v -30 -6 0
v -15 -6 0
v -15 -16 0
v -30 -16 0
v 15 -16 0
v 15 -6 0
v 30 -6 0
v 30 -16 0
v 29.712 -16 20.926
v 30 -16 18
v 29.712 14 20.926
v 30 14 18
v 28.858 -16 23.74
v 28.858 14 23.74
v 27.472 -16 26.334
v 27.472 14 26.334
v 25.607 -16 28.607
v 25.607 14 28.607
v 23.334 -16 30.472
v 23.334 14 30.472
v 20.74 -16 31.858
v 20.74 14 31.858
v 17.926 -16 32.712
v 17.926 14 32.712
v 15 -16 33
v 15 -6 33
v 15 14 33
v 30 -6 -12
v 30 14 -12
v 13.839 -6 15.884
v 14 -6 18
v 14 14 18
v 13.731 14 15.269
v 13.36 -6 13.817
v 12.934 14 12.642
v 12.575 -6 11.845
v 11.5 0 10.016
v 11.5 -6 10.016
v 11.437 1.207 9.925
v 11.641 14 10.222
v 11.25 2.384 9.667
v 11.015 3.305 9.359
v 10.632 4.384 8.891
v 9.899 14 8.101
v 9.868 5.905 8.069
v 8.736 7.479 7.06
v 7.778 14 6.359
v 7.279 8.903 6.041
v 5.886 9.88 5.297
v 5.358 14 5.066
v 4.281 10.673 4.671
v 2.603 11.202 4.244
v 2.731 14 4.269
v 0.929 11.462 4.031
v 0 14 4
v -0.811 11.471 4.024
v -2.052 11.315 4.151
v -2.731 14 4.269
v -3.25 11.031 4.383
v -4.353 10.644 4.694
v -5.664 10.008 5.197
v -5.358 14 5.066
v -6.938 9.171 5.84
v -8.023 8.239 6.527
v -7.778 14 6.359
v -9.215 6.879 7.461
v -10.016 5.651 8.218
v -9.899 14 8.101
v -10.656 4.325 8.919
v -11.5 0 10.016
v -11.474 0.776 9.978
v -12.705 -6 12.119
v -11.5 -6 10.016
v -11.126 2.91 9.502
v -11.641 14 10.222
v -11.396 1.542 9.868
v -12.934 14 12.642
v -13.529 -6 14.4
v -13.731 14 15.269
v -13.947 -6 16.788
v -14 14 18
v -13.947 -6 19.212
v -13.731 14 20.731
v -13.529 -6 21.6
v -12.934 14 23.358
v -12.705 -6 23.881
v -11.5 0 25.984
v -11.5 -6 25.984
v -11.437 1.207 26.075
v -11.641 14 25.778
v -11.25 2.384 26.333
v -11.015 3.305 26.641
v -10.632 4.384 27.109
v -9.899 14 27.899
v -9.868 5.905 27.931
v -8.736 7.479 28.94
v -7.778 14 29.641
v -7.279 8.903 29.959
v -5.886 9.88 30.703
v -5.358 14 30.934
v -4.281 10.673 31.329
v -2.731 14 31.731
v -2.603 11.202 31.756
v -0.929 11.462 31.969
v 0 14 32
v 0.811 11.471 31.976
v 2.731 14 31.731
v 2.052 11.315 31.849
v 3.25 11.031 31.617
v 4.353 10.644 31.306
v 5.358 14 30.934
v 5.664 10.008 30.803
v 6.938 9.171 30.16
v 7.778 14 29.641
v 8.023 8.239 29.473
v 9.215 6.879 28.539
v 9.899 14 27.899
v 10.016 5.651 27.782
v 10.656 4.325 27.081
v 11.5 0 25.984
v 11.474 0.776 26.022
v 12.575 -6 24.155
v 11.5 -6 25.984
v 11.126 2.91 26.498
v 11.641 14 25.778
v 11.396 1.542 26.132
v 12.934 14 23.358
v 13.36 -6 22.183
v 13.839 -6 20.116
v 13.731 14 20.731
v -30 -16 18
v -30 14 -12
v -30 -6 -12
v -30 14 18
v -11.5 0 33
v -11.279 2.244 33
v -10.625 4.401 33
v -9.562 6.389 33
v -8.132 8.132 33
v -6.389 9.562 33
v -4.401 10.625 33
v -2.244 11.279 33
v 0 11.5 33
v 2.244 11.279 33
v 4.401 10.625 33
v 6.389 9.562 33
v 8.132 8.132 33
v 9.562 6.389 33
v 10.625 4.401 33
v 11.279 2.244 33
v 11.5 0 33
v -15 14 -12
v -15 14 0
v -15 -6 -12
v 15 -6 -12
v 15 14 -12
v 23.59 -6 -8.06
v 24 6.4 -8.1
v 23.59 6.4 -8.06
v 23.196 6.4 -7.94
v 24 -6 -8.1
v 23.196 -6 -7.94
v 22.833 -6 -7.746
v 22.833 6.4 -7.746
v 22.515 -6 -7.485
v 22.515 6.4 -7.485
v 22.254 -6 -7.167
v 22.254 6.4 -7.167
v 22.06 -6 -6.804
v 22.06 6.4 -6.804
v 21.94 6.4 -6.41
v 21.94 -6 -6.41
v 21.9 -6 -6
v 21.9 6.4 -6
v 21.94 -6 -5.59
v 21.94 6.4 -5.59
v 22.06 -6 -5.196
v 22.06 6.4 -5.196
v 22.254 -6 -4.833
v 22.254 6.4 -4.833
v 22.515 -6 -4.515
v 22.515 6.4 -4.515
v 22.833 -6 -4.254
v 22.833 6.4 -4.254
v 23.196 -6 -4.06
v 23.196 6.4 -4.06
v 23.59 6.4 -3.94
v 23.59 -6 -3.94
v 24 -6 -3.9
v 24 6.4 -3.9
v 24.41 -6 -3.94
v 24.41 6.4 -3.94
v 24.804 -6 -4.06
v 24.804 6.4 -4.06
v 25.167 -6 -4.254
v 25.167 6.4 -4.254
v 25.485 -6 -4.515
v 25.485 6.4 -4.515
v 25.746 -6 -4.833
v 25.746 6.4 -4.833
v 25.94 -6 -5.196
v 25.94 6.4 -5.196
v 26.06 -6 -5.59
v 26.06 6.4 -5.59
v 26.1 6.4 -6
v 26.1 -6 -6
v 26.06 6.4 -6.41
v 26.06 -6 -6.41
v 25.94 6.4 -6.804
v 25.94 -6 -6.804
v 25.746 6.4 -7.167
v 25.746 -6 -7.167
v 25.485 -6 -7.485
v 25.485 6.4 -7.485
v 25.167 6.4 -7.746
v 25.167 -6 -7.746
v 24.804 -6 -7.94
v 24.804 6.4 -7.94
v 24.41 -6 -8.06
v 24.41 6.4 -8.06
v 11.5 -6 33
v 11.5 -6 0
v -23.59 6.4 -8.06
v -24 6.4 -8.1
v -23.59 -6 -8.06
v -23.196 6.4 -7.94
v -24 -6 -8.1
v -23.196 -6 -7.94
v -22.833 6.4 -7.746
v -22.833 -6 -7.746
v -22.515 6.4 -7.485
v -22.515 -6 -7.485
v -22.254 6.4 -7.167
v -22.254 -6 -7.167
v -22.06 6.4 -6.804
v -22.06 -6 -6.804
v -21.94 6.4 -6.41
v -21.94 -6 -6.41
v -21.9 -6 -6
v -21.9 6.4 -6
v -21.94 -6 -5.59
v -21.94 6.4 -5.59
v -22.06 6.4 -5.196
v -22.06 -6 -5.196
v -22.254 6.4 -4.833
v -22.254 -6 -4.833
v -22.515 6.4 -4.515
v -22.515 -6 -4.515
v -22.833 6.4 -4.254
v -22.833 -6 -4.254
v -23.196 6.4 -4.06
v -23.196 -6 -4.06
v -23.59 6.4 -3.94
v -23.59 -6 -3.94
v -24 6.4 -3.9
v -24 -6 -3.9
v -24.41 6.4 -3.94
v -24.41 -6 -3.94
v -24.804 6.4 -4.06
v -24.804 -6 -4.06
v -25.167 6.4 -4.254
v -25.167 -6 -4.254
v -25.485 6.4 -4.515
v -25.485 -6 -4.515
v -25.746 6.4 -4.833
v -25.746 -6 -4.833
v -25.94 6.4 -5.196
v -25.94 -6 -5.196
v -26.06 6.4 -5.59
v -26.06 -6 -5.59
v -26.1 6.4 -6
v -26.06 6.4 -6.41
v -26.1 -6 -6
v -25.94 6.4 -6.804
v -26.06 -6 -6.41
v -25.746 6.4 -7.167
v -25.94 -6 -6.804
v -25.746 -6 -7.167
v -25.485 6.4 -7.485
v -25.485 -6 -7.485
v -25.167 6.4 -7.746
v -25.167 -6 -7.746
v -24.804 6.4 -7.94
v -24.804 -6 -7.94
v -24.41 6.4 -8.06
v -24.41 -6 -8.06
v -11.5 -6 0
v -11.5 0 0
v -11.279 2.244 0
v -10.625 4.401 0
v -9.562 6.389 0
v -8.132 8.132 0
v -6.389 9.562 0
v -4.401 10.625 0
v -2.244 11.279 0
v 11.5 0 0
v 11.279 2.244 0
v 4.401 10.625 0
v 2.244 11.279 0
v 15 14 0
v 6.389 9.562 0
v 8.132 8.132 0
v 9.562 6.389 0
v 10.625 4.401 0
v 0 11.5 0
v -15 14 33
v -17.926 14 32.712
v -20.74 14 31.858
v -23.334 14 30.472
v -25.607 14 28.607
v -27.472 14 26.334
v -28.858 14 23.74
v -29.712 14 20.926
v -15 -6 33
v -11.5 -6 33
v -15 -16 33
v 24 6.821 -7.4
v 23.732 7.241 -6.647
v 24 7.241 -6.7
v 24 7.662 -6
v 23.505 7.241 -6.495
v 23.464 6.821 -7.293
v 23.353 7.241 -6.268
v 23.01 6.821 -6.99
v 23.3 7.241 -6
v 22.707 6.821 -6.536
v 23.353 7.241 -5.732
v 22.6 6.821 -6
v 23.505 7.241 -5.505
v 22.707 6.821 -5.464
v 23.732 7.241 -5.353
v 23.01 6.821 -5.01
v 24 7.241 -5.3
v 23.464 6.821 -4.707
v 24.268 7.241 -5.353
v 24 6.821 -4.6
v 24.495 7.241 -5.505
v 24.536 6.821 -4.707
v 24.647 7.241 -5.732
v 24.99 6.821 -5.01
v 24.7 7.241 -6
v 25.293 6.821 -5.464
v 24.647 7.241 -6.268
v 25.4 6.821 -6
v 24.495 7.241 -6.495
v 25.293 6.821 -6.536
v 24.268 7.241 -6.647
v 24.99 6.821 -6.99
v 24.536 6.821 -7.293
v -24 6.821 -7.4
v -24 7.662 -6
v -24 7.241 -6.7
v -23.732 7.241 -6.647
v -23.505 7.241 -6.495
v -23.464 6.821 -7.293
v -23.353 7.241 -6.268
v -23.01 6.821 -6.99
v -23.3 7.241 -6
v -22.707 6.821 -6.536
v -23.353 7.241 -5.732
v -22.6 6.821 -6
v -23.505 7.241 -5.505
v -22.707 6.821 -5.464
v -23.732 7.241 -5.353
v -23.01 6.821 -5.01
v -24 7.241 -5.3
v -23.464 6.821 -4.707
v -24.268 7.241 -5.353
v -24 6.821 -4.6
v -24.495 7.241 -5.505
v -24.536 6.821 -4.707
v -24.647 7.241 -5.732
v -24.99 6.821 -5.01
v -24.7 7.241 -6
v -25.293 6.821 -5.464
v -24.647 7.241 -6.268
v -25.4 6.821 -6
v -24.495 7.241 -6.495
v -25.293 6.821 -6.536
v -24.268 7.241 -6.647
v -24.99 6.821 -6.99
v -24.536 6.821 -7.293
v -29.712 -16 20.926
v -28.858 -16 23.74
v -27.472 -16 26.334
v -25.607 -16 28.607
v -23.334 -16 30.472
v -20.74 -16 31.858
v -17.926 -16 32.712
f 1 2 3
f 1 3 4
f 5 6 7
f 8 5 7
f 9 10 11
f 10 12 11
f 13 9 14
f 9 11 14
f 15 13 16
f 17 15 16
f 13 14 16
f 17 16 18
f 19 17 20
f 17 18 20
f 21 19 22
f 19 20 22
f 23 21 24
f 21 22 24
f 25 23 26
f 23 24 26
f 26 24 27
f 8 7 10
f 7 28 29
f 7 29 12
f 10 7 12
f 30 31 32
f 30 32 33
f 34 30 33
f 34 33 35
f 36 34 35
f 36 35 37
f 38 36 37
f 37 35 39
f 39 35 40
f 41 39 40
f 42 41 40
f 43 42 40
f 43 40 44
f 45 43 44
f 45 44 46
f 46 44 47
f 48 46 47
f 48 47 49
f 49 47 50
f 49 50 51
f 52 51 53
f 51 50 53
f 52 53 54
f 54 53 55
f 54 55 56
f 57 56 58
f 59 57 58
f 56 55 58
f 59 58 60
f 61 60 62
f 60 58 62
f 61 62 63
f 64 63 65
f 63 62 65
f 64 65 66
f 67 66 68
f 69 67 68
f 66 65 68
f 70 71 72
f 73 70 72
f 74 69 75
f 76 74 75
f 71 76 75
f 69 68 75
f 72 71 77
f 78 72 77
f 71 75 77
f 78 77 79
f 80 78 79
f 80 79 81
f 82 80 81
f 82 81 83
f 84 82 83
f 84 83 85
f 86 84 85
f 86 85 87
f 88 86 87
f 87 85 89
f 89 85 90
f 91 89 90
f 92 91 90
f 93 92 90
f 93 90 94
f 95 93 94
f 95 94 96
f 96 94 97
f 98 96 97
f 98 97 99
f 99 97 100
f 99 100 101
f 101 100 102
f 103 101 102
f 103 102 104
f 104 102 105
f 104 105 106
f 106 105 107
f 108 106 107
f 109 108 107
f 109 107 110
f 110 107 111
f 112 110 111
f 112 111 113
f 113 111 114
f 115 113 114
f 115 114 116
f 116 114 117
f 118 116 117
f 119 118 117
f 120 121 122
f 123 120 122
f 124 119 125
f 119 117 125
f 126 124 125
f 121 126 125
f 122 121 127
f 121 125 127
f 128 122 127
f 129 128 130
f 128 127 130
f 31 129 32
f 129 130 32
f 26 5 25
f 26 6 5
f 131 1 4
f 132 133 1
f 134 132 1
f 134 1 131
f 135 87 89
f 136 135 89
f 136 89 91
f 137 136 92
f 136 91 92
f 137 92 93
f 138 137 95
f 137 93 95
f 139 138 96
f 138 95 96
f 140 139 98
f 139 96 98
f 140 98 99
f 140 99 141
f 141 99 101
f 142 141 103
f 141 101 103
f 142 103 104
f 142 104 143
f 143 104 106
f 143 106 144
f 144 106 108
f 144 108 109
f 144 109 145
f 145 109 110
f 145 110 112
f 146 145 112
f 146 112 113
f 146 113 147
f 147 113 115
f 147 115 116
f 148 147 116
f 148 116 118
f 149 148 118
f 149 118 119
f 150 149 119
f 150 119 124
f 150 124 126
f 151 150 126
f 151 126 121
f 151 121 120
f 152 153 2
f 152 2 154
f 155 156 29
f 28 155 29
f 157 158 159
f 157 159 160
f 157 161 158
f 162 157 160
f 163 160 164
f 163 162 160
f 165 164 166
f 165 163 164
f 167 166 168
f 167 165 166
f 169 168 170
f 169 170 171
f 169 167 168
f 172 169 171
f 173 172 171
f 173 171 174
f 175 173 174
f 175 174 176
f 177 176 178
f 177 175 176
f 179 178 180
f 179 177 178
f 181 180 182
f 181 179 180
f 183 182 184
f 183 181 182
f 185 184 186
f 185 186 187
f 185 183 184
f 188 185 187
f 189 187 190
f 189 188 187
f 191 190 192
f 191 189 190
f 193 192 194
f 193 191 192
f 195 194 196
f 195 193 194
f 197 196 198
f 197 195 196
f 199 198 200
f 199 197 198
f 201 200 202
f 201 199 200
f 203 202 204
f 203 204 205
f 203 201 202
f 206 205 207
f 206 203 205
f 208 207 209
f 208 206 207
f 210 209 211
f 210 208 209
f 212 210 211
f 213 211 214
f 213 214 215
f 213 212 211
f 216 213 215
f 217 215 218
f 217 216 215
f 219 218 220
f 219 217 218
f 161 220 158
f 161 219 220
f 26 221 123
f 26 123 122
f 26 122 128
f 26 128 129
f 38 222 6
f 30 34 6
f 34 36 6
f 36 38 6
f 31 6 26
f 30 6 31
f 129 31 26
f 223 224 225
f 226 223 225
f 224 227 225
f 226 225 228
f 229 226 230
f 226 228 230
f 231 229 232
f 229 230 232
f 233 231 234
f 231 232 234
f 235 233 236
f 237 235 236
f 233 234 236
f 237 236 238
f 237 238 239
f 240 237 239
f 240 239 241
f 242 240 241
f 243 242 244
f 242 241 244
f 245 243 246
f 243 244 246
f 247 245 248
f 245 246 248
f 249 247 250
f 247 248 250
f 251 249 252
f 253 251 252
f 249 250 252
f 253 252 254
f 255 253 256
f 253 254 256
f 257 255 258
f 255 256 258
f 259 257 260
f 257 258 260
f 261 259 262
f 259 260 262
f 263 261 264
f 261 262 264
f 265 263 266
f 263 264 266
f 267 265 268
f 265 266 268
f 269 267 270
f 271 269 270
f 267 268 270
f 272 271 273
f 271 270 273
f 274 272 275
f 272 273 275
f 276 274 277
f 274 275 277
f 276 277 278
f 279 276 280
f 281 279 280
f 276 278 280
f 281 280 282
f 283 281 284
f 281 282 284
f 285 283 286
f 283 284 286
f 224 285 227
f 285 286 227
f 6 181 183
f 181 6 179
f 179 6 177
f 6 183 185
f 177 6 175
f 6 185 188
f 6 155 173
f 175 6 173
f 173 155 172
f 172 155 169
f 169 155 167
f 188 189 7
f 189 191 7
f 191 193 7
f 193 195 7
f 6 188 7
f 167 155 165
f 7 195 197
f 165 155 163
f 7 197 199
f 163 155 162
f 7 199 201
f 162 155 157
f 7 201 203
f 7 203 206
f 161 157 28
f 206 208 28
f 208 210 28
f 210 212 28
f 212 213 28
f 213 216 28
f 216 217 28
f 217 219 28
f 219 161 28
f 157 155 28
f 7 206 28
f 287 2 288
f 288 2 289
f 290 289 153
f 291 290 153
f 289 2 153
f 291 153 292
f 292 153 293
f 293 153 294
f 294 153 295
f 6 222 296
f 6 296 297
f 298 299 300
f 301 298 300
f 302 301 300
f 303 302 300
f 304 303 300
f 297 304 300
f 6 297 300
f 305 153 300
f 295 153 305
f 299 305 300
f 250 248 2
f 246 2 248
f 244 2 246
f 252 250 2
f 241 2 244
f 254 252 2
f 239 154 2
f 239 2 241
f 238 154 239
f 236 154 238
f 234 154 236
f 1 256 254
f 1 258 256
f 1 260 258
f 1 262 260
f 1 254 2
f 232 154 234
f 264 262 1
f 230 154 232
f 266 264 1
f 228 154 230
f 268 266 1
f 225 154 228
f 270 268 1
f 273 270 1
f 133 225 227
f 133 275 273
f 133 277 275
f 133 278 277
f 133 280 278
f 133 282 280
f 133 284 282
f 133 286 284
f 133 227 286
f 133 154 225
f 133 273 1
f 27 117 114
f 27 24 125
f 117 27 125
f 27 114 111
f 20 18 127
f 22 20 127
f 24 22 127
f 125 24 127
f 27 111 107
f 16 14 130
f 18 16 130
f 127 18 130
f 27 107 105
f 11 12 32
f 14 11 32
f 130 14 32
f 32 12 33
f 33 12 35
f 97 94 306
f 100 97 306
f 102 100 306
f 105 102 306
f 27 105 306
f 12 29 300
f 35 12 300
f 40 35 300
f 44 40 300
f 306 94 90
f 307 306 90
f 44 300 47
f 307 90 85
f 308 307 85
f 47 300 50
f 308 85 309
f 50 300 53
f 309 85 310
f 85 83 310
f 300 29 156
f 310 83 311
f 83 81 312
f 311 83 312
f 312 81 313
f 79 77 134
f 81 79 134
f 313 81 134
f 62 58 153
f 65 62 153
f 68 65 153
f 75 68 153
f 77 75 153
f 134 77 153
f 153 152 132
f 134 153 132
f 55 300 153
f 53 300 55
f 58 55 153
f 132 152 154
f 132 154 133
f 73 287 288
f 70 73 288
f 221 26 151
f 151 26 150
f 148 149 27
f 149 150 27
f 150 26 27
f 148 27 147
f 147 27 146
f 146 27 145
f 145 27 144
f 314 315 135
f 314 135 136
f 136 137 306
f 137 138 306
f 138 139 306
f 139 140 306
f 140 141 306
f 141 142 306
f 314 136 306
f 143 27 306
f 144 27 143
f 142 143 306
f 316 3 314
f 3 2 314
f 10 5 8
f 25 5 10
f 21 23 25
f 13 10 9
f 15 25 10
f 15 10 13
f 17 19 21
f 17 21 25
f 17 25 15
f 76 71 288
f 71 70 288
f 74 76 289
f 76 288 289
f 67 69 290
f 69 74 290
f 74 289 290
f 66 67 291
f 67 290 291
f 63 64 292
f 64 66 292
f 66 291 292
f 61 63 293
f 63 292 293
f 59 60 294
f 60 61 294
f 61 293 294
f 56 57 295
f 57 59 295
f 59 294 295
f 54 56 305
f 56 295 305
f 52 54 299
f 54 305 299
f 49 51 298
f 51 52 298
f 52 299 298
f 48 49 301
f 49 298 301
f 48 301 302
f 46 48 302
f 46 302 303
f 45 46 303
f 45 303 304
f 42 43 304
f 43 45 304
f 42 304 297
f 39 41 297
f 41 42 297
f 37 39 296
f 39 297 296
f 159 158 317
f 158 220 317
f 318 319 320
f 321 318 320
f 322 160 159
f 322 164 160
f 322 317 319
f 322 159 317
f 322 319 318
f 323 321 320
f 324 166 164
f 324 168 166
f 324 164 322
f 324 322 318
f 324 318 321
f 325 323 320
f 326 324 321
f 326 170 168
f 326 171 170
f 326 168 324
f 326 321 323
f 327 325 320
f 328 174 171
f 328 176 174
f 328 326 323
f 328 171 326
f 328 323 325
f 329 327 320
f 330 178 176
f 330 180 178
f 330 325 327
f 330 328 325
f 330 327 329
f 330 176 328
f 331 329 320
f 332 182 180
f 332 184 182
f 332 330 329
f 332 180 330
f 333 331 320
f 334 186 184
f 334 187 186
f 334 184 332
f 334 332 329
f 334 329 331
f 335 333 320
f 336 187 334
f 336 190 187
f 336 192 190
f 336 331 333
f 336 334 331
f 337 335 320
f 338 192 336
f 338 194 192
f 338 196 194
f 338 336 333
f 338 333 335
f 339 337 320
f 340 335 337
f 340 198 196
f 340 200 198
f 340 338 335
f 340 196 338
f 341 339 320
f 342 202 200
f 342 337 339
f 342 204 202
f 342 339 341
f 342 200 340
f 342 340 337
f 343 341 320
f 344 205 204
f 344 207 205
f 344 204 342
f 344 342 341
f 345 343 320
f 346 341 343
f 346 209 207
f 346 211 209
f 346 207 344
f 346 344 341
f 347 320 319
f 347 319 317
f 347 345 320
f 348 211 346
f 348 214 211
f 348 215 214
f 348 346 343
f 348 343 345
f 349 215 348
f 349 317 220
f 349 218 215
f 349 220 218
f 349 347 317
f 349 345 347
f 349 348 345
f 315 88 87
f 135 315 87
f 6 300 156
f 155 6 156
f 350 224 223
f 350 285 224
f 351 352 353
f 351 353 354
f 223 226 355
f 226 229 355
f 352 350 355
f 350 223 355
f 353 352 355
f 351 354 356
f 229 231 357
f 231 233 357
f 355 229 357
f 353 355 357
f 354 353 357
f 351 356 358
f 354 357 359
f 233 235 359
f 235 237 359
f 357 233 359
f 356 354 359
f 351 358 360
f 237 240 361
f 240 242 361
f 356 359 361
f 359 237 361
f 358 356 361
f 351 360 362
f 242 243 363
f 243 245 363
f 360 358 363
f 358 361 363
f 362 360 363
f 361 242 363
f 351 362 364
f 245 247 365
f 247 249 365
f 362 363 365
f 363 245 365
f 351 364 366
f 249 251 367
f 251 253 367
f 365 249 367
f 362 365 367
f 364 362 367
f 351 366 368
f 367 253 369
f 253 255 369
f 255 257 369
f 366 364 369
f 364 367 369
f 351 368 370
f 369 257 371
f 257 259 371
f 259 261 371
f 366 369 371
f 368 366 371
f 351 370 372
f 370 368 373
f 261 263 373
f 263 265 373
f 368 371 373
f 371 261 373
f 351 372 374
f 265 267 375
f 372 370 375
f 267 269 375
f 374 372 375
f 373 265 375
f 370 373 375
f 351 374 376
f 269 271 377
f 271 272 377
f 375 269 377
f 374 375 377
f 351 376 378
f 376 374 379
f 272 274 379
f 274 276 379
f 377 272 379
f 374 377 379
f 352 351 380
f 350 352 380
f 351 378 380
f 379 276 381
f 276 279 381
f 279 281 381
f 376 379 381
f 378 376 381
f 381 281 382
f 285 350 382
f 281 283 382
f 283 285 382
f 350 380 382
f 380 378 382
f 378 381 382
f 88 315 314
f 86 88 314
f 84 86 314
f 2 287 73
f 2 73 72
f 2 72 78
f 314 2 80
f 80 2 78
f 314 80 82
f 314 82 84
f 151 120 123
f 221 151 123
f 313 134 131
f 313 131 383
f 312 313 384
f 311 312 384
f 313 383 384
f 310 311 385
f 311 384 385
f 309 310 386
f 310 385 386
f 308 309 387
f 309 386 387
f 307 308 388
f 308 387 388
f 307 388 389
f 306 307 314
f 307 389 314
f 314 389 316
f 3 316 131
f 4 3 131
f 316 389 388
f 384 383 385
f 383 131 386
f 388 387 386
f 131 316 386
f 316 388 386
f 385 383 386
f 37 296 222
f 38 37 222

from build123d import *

# Parameters (mm, degrees)
BOSS_EXTRUDE1_DEPTH = 33
SKETCH3_R           = 14
CUT_EXTRUDE1_DEPTH  = 21
SKETCH4_W           = 15
SKETCH4_H           = 45
BOSS_EXTRUDE2_DEPTH = 20
SKETCH7_W           = 15
SKETCH7_H           = 33
BOSS_EXTRUDE3_DEPTH = 10
FILLET1_R           = 15


with BuildPart() as part:
    # Sketch2 → Boss-Extrude1 (new body)
    with BuildSketch(Plane.XY):
        with BuildLine():
            Line((11.5, 0), (11.5, -6))
            Line((11.5, -6), (15, -6))
            Line((15, -6), (15, 14))
            Line((15, 14), (-15, 14))
            Line((-15, 14), (-15, -6))
            Line((-15, -6), (-11.5, -6))
            Line((-11.5, -6), (-11.5, 0))
            ThreePointArc((-11.5, 0), (0, 11.5), (11.5, 0))
        make_face()
    extrude(amount=BOSS_EXTRUDE1_DEPTH)

    # Sketch3 → Cut-Extrude1 (cut, through all)
    with BuildSketch(Plane(origin=(0, 14, 0), x_dir=(1, 0, 0), z_dir=(0, 1, 0))):
        with Locations((0, -18)):
            Circle(SKETCH3_R)
    extrude(amount=-CUT_EXTRUDE1_DEPTH, mode=Mode.SUBTRACT)

    # Sketch4 → Boss-Extrude2 (add)
    with BuildSketch(Plane(origin=(0, 14, 0), x_dir=(1, 0, 0), z_dir=(0, 1, 0))):
        with Locations((22.5, -10.5)):
            Rectangle(SKETCH4_W, SKETCH4_H)
    boss_extrude2 = extrude(amount=-BOSS_EXTRUDE2_DEPTH)

    # Sketch6 → M5x0.8 Tapped Hole1 (revolve, cut)
    with BuildSketch(Plane(origin=(24, -6, -6), x_dir=(0, 0, -1), z_dir=(1, 0, 0))):
        Polygon((0, 0), (0, 13.6618073), (2.1, 12.4), (2.1, 0), align=None)
    m5x0_8_tapped_hole1 = revolve(axis=Axis((24, -12.35, -6), (0, 1, 0)), mode=Mode.SUBTRACT)

    # Sketch7 → Boss-Extrude3 (add)
    with BuildSketch(Plane.XZ.offset(6)):
        with Locations((22.5, 16.5)):
            Rectangle(SKETCH7_W, SKETCH7_H)
    boss_extrude3 = extrude(amount=BOSS_EXTRUDE3_DEPTH)

    # Mirror1: Boss-Extrude2, M5x0.8 Tapped Hole1, Boss-Extrude3 across plane
    add(boss_extrude2.mirror(Plane(origin=(0, 0, 0), x_dir=(0, 0, 1), z_dir=(1, 0, 0))))
    add(m5x0_8_tapped_hole1.mirror(Plane(origin=(0, 0, 0), x_dir=(0, 0, 1), z_dir=(1, 0, 0))), mode=Mode.SUBTRACT)
    add(boss_extrude3.mirror(Plane(origin=(0, 0, 0), x_dir=(0, 0, 1), z_dir=(1, 0, 0))))

    # Fillet1
    fillet1_edges = [part.edges().sort_by_distance(p)[0] for p in [
        (30, -1, 33),
        (-30, -1, 33),
    ]]
    fillet(fillet1_edges, radius=FILLET1_R)


solid = part.part
